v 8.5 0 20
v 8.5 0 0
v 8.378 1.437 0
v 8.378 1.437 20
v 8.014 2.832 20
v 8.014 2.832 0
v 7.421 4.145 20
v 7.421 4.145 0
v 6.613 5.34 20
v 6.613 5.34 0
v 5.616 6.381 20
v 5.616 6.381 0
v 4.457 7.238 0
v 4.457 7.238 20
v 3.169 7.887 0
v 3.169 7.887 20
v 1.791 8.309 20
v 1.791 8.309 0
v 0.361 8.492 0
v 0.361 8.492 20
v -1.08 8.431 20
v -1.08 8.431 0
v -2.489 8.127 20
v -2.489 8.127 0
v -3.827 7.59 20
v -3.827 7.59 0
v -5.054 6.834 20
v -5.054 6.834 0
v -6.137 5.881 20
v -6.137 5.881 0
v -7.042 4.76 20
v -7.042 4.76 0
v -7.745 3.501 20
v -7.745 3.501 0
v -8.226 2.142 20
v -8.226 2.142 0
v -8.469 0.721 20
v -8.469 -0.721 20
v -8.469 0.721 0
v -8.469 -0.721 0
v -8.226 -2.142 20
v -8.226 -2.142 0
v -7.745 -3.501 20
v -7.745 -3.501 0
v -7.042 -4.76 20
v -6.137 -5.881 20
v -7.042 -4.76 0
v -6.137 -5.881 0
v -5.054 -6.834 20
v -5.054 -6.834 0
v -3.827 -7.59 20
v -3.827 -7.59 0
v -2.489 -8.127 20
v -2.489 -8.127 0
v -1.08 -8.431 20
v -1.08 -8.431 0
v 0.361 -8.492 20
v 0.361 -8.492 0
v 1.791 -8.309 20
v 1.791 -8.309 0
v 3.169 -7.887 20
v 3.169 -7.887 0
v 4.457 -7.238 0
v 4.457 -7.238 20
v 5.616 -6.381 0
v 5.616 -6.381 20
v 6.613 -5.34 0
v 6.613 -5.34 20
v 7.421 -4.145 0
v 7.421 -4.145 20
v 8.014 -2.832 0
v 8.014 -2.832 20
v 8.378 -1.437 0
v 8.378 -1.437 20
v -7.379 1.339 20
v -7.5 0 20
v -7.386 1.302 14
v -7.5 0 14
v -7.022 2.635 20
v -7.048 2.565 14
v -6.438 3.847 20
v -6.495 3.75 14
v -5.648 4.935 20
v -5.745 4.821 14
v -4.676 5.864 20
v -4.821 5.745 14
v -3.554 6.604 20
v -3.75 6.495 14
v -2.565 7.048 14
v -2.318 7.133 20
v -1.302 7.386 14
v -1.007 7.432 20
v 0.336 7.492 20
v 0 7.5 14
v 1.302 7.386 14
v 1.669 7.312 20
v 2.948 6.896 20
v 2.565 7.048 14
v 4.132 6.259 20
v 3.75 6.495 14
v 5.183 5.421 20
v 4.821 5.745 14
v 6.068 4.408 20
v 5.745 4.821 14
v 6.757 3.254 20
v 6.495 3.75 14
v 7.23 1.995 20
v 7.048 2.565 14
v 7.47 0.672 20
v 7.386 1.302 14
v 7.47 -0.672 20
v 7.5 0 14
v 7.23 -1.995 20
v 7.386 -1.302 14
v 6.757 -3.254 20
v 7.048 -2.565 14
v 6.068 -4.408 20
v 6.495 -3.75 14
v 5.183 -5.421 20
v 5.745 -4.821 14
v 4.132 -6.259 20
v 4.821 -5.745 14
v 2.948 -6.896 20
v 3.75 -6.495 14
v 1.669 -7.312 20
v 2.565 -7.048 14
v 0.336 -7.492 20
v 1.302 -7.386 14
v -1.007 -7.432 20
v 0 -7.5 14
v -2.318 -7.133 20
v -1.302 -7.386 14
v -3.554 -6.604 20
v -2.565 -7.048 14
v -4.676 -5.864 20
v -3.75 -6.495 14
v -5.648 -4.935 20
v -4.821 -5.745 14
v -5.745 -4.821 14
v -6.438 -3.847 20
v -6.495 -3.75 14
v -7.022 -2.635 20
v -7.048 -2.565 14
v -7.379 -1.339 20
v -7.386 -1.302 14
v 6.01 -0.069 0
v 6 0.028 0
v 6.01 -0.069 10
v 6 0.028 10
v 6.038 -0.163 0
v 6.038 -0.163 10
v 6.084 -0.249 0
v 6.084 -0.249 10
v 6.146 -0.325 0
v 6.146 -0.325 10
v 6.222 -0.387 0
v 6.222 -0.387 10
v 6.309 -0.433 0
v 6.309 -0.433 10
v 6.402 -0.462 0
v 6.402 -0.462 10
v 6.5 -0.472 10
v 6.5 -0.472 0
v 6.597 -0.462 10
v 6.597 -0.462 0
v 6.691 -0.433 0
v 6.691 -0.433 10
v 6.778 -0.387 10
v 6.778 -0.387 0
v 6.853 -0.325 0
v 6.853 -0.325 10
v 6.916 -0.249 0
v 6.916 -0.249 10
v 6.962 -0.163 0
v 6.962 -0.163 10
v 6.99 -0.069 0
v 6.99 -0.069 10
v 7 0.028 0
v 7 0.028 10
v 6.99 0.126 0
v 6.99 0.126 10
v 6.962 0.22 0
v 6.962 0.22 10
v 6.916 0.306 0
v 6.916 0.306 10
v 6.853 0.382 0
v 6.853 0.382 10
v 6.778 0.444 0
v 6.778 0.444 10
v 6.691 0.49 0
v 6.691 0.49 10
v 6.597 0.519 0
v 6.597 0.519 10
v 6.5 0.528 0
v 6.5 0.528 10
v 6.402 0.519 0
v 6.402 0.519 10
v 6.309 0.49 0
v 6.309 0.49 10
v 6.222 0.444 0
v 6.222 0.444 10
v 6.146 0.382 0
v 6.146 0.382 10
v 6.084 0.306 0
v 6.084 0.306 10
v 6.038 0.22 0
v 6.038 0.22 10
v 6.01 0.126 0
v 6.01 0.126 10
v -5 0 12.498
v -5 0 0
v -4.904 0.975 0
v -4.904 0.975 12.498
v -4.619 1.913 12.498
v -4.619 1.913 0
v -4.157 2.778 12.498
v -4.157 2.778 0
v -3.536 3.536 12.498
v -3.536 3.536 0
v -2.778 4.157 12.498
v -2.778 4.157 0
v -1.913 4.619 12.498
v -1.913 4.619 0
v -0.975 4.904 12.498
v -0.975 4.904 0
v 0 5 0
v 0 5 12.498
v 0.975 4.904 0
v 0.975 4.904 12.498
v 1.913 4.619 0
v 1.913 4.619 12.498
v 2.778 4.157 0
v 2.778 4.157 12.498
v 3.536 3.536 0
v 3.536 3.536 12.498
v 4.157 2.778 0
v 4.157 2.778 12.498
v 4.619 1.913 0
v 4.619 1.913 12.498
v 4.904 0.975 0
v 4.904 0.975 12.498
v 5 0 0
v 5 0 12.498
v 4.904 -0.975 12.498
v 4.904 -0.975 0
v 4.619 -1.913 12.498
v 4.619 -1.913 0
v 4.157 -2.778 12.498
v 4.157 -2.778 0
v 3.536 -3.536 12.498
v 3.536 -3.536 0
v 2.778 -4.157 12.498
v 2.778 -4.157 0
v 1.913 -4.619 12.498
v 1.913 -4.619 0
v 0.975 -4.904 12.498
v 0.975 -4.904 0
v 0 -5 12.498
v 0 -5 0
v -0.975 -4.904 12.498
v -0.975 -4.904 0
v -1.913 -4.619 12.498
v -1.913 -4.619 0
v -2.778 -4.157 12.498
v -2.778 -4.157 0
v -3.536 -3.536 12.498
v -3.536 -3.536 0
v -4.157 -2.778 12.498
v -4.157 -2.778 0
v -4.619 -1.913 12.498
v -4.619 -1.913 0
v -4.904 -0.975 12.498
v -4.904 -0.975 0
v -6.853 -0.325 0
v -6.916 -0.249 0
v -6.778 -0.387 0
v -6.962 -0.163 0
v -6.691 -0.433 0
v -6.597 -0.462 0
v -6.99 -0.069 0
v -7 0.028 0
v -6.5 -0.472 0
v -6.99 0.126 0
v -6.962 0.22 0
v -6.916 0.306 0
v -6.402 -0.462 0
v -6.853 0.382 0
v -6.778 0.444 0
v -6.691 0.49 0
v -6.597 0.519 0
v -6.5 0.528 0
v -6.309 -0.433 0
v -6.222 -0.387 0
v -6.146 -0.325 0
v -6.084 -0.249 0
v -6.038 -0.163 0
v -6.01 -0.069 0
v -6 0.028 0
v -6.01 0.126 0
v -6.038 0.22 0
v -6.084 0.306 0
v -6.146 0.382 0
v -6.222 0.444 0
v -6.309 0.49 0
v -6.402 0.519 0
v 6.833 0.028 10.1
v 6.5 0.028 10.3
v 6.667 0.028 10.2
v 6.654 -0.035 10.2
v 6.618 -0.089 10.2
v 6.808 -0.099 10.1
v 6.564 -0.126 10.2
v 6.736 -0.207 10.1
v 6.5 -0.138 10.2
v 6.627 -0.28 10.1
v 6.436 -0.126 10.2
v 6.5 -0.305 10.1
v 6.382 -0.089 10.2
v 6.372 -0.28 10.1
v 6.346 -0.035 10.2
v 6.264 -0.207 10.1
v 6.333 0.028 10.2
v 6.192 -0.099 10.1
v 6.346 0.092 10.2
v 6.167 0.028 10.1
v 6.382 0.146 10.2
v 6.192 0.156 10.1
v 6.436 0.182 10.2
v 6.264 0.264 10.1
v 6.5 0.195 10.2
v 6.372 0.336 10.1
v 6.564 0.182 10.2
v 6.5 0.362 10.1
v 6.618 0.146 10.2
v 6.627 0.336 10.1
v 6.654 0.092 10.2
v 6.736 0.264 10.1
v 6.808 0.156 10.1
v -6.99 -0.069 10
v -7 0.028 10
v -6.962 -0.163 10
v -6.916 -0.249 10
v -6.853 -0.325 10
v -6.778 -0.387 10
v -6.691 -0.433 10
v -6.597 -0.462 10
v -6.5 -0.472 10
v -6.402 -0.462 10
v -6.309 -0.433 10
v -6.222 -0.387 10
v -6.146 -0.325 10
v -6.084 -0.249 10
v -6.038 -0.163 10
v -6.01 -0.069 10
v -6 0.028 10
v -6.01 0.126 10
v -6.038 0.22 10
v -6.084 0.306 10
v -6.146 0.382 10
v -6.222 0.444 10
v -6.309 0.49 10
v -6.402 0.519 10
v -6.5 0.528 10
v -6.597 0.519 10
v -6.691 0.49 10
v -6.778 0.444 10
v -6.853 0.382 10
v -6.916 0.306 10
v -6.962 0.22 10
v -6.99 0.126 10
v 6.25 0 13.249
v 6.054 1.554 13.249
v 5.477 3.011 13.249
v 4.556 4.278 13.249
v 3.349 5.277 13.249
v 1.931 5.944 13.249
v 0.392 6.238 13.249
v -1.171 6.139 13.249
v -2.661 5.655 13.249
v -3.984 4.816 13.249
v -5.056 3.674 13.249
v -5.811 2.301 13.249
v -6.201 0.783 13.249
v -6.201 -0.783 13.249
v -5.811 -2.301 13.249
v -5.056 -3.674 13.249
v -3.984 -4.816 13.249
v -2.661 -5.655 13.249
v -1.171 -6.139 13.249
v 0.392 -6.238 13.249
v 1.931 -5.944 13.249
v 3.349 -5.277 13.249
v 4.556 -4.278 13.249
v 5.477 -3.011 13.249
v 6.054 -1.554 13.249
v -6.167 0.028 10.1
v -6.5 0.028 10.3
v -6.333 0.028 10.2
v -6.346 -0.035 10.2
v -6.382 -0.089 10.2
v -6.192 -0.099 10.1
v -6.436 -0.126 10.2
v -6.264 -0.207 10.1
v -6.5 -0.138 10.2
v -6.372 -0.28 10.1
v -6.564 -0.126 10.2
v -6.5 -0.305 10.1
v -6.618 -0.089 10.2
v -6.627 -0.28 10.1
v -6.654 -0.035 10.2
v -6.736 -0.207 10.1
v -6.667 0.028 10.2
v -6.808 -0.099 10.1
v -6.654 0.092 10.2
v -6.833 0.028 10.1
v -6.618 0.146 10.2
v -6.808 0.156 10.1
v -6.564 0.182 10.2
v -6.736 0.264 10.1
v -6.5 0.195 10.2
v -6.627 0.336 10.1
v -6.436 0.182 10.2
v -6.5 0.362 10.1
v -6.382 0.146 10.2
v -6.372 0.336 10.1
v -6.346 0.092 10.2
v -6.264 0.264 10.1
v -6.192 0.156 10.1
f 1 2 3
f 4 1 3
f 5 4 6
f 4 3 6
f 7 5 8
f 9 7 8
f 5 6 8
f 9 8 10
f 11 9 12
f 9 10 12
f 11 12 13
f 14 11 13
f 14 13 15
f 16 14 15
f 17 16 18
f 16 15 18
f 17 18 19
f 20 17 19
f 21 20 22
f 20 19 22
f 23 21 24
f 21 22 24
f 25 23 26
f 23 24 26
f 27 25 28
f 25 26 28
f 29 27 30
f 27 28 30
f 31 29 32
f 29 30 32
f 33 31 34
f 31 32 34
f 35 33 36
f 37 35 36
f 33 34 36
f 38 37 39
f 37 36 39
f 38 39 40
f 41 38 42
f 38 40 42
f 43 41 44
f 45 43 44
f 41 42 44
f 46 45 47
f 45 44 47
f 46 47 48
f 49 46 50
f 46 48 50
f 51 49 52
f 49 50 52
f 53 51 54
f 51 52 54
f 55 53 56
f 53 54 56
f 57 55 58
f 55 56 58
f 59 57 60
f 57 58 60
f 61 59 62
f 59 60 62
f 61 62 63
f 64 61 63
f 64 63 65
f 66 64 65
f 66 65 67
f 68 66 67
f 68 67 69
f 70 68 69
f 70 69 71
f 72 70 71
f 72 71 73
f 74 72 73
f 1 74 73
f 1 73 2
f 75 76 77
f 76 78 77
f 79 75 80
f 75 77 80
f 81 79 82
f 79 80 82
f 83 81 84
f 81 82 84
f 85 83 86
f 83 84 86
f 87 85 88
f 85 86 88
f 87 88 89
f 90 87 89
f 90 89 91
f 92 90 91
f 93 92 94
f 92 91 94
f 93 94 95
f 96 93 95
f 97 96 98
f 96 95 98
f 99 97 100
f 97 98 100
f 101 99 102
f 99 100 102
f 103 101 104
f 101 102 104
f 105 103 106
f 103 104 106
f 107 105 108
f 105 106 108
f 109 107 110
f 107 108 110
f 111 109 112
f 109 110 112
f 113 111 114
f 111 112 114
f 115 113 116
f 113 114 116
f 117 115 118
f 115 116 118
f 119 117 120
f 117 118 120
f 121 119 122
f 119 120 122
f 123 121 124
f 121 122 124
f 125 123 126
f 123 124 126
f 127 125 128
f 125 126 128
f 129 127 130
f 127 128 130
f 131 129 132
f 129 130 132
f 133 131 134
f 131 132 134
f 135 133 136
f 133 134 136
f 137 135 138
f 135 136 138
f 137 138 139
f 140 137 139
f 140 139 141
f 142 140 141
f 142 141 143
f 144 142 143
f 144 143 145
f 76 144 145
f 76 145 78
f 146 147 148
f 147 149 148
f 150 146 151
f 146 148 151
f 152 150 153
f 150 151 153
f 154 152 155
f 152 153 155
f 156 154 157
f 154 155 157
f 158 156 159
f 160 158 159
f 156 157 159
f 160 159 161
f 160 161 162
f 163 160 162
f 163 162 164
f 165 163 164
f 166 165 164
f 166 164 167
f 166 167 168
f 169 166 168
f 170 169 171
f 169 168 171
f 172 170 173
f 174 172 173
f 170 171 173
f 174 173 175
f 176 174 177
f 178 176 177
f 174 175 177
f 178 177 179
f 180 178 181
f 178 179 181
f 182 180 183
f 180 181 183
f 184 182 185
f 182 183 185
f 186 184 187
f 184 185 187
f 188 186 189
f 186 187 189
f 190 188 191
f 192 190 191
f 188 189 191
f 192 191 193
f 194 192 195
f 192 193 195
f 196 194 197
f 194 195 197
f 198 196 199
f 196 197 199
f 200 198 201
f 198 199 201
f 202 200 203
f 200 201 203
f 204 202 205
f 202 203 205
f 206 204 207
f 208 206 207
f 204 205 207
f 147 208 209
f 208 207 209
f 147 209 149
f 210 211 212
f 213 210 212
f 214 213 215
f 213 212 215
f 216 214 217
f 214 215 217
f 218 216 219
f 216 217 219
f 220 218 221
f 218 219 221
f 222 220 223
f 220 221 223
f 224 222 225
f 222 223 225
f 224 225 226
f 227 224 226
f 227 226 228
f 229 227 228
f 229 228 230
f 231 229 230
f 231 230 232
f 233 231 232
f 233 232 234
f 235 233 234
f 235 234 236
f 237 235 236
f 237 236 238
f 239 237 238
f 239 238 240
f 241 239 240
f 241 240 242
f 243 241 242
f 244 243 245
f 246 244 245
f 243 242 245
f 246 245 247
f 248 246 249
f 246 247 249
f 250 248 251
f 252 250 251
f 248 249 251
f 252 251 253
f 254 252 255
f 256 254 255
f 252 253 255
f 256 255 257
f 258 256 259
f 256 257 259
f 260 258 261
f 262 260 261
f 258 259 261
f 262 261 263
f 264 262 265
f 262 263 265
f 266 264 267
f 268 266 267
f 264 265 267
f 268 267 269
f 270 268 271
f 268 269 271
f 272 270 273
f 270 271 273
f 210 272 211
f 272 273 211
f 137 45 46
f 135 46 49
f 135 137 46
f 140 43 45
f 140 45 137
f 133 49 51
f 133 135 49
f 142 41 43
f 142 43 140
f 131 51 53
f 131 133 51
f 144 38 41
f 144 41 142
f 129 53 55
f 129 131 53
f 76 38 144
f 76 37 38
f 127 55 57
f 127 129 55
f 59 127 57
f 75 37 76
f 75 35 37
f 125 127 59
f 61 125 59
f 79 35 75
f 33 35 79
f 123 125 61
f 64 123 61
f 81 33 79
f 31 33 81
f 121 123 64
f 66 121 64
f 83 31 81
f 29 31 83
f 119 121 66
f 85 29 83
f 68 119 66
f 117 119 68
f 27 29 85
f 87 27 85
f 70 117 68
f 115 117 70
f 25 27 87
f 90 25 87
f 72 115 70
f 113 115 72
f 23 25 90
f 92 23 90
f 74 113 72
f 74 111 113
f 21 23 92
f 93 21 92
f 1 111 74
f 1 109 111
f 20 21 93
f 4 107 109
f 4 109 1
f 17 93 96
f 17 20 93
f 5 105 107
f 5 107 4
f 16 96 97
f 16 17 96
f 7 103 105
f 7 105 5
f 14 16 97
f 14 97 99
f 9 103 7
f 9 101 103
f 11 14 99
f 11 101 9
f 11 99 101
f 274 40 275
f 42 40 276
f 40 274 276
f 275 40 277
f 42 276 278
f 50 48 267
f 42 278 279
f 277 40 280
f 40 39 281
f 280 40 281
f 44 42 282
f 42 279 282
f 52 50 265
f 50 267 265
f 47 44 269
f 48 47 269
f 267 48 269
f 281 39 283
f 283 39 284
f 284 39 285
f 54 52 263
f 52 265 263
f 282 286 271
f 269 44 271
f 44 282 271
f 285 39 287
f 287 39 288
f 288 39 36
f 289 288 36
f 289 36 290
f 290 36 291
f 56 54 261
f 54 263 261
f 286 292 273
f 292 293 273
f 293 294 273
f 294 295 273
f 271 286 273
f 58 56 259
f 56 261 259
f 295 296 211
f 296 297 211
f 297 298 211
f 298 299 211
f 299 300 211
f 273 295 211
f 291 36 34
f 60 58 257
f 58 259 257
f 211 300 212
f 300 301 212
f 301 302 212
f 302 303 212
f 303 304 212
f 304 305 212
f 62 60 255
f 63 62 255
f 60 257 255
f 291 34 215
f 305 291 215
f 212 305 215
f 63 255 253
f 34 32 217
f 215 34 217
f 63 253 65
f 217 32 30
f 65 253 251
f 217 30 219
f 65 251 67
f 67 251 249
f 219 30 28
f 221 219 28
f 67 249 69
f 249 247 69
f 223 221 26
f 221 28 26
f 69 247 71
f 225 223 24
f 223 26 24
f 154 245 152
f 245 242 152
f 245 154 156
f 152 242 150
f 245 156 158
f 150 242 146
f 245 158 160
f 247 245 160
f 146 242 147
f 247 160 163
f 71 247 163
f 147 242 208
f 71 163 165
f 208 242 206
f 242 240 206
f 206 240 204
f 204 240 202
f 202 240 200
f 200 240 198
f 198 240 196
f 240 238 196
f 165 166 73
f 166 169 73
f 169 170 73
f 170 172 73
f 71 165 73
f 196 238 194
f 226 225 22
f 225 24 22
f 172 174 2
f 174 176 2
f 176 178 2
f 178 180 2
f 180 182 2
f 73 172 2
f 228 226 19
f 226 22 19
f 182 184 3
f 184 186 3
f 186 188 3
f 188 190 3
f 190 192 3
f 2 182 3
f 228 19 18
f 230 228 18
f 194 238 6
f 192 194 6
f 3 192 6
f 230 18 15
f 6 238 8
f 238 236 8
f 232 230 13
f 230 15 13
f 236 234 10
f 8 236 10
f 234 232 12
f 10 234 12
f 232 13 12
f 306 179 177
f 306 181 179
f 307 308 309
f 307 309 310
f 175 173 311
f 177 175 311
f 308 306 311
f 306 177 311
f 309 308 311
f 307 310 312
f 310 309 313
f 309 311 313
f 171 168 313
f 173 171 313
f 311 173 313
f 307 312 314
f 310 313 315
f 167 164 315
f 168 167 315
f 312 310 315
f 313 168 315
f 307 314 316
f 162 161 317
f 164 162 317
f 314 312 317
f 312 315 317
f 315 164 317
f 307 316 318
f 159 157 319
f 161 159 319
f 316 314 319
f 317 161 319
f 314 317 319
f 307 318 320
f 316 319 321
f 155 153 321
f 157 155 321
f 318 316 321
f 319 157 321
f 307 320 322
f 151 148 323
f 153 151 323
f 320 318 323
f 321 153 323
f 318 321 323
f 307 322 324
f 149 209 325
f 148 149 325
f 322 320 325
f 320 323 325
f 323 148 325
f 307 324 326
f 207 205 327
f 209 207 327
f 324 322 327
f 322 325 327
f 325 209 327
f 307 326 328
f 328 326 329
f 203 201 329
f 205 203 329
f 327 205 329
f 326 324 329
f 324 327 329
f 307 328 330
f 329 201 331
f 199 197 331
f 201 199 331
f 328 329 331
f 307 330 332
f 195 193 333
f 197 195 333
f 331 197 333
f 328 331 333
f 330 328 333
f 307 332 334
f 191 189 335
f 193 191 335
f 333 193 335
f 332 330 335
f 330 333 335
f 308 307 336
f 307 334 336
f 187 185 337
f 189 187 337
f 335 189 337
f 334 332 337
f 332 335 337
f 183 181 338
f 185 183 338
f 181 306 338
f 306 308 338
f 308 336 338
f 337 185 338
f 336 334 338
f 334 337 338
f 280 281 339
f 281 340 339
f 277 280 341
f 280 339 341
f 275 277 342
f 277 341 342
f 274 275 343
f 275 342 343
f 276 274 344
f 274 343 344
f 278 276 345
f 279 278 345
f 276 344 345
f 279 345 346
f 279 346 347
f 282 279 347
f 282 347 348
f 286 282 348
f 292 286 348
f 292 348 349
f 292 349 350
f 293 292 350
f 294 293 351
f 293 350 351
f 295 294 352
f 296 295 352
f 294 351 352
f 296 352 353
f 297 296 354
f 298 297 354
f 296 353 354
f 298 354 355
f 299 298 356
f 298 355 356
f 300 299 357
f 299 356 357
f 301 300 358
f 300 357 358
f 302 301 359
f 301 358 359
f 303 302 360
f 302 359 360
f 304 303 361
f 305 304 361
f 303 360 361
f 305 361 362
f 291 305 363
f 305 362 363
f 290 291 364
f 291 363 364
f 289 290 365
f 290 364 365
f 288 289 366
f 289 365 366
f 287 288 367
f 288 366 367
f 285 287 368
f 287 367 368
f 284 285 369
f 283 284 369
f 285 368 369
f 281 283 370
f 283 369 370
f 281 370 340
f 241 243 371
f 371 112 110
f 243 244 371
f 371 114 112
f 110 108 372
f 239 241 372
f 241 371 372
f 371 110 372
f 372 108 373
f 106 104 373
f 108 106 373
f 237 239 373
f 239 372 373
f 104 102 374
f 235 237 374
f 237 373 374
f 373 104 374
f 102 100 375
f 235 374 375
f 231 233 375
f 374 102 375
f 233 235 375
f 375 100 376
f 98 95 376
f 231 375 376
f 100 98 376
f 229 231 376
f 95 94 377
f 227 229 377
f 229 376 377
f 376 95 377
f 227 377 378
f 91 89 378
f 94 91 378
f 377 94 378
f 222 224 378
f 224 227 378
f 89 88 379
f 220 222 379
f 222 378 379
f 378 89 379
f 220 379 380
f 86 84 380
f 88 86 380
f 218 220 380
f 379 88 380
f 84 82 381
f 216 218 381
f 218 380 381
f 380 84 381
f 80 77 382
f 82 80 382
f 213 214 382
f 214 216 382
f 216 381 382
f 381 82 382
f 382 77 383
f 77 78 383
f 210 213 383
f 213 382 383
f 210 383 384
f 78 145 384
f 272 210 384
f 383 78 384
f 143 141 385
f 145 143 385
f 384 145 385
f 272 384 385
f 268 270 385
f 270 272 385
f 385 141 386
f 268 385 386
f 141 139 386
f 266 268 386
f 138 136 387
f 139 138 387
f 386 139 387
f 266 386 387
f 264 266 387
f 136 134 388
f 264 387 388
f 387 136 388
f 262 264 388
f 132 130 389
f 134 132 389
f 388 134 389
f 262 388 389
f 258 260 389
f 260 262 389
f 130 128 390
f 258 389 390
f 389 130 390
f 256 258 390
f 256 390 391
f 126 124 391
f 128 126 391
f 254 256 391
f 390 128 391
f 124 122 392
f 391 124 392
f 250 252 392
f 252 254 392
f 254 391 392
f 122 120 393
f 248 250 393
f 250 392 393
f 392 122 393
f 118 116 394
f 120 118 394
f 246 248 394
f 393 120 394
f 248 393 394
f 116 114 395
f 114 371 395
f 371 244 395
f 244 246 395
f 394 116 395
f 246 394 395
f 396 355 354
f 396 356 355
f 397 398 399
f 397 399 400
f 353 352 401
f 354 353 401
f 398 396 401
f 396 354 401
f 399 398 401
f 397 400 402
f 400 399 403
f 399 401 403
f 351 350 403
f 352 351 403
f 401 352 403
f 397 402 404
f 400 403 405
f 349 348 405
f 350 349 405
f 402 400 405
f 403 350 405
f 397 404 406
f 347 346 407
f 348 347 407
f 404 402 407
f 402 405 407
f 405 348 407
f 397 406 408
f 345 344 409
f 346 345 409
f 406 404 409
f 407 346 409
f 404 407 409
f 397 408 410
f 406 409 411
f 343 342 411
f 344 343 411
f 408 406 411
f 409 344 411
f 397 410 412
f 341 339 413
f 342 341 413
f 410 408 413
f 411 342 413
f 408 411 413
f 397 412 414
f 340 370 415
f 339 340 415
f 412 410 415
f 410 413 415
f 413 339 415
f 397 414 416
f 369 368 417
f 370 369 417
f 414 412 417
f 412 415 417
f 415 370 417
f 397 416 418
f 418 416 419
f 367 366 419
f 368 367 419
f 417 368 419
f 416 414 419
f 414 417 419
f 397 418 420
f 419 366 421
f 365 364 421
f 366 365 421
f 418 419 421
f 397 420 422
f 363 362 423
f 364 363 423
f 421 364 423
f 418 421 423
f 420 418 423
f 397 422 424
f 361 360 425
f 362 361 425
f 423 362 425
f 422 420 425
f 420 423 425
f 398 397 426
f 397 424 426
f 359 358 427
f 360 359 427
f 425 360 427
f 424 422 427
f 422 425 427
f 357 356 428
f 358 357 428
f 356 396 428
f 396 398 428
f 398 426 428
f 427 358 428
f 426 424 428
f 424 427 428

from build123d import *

# Parameters (mm, degrees)
F0_R     = 8.5
F1_DEPTH = 20
F3_D     = 10
F4_D     = 15
F4_DEPTH = 6
F4_TIP   = 4.5064546427
F6_D     = 1
F6_DEPTH = 10
F6_TIP   = 0.3004303095


with BuildPart() as f1:
    # F0 (on Top) → F1 (new body)
    with BuildSketch(Plane.XY):
        Circle(F0_R)
    extrude(amount=F1_DEPTH)

    # F3 (through all)
    with Locations(Plane.XY.offset(20)):
        with Locations((0, 0)):
            Hole(F3_D / 2)

    # F4
    with Locations(Plane.XY.offset(20)):
        with Locations((0, 0)):
            Hole(F4_D / 2, depth=F4_DEPTH)
            with Locations((0, 0, -(F4_DEPTH + F4_TIP / 2))):  # 118° drill point
                Cone(0, F4_D / 2, F4_TIP, mode=Mode.SUBTRACT)

    # F6
    with Locations(Plane(origin=(0, 0, 0), x_dir=(1, 0, 0), z_dir=(0, 0, -1))):
        with Locations((-6.499937755, -0.0284461158), (6.499937755, -0.0284461158)):
            Hole(F6_D / 2, depth=F6_DEPTH)
            with Locations((0, 0, -(F6_DEPTH + F6_TIP / 2))):  # 118° drill point
                Cone(0, F6_D / 2, F6_TIP, mode=Mode.SUBTRACT)


solid = f1.part
